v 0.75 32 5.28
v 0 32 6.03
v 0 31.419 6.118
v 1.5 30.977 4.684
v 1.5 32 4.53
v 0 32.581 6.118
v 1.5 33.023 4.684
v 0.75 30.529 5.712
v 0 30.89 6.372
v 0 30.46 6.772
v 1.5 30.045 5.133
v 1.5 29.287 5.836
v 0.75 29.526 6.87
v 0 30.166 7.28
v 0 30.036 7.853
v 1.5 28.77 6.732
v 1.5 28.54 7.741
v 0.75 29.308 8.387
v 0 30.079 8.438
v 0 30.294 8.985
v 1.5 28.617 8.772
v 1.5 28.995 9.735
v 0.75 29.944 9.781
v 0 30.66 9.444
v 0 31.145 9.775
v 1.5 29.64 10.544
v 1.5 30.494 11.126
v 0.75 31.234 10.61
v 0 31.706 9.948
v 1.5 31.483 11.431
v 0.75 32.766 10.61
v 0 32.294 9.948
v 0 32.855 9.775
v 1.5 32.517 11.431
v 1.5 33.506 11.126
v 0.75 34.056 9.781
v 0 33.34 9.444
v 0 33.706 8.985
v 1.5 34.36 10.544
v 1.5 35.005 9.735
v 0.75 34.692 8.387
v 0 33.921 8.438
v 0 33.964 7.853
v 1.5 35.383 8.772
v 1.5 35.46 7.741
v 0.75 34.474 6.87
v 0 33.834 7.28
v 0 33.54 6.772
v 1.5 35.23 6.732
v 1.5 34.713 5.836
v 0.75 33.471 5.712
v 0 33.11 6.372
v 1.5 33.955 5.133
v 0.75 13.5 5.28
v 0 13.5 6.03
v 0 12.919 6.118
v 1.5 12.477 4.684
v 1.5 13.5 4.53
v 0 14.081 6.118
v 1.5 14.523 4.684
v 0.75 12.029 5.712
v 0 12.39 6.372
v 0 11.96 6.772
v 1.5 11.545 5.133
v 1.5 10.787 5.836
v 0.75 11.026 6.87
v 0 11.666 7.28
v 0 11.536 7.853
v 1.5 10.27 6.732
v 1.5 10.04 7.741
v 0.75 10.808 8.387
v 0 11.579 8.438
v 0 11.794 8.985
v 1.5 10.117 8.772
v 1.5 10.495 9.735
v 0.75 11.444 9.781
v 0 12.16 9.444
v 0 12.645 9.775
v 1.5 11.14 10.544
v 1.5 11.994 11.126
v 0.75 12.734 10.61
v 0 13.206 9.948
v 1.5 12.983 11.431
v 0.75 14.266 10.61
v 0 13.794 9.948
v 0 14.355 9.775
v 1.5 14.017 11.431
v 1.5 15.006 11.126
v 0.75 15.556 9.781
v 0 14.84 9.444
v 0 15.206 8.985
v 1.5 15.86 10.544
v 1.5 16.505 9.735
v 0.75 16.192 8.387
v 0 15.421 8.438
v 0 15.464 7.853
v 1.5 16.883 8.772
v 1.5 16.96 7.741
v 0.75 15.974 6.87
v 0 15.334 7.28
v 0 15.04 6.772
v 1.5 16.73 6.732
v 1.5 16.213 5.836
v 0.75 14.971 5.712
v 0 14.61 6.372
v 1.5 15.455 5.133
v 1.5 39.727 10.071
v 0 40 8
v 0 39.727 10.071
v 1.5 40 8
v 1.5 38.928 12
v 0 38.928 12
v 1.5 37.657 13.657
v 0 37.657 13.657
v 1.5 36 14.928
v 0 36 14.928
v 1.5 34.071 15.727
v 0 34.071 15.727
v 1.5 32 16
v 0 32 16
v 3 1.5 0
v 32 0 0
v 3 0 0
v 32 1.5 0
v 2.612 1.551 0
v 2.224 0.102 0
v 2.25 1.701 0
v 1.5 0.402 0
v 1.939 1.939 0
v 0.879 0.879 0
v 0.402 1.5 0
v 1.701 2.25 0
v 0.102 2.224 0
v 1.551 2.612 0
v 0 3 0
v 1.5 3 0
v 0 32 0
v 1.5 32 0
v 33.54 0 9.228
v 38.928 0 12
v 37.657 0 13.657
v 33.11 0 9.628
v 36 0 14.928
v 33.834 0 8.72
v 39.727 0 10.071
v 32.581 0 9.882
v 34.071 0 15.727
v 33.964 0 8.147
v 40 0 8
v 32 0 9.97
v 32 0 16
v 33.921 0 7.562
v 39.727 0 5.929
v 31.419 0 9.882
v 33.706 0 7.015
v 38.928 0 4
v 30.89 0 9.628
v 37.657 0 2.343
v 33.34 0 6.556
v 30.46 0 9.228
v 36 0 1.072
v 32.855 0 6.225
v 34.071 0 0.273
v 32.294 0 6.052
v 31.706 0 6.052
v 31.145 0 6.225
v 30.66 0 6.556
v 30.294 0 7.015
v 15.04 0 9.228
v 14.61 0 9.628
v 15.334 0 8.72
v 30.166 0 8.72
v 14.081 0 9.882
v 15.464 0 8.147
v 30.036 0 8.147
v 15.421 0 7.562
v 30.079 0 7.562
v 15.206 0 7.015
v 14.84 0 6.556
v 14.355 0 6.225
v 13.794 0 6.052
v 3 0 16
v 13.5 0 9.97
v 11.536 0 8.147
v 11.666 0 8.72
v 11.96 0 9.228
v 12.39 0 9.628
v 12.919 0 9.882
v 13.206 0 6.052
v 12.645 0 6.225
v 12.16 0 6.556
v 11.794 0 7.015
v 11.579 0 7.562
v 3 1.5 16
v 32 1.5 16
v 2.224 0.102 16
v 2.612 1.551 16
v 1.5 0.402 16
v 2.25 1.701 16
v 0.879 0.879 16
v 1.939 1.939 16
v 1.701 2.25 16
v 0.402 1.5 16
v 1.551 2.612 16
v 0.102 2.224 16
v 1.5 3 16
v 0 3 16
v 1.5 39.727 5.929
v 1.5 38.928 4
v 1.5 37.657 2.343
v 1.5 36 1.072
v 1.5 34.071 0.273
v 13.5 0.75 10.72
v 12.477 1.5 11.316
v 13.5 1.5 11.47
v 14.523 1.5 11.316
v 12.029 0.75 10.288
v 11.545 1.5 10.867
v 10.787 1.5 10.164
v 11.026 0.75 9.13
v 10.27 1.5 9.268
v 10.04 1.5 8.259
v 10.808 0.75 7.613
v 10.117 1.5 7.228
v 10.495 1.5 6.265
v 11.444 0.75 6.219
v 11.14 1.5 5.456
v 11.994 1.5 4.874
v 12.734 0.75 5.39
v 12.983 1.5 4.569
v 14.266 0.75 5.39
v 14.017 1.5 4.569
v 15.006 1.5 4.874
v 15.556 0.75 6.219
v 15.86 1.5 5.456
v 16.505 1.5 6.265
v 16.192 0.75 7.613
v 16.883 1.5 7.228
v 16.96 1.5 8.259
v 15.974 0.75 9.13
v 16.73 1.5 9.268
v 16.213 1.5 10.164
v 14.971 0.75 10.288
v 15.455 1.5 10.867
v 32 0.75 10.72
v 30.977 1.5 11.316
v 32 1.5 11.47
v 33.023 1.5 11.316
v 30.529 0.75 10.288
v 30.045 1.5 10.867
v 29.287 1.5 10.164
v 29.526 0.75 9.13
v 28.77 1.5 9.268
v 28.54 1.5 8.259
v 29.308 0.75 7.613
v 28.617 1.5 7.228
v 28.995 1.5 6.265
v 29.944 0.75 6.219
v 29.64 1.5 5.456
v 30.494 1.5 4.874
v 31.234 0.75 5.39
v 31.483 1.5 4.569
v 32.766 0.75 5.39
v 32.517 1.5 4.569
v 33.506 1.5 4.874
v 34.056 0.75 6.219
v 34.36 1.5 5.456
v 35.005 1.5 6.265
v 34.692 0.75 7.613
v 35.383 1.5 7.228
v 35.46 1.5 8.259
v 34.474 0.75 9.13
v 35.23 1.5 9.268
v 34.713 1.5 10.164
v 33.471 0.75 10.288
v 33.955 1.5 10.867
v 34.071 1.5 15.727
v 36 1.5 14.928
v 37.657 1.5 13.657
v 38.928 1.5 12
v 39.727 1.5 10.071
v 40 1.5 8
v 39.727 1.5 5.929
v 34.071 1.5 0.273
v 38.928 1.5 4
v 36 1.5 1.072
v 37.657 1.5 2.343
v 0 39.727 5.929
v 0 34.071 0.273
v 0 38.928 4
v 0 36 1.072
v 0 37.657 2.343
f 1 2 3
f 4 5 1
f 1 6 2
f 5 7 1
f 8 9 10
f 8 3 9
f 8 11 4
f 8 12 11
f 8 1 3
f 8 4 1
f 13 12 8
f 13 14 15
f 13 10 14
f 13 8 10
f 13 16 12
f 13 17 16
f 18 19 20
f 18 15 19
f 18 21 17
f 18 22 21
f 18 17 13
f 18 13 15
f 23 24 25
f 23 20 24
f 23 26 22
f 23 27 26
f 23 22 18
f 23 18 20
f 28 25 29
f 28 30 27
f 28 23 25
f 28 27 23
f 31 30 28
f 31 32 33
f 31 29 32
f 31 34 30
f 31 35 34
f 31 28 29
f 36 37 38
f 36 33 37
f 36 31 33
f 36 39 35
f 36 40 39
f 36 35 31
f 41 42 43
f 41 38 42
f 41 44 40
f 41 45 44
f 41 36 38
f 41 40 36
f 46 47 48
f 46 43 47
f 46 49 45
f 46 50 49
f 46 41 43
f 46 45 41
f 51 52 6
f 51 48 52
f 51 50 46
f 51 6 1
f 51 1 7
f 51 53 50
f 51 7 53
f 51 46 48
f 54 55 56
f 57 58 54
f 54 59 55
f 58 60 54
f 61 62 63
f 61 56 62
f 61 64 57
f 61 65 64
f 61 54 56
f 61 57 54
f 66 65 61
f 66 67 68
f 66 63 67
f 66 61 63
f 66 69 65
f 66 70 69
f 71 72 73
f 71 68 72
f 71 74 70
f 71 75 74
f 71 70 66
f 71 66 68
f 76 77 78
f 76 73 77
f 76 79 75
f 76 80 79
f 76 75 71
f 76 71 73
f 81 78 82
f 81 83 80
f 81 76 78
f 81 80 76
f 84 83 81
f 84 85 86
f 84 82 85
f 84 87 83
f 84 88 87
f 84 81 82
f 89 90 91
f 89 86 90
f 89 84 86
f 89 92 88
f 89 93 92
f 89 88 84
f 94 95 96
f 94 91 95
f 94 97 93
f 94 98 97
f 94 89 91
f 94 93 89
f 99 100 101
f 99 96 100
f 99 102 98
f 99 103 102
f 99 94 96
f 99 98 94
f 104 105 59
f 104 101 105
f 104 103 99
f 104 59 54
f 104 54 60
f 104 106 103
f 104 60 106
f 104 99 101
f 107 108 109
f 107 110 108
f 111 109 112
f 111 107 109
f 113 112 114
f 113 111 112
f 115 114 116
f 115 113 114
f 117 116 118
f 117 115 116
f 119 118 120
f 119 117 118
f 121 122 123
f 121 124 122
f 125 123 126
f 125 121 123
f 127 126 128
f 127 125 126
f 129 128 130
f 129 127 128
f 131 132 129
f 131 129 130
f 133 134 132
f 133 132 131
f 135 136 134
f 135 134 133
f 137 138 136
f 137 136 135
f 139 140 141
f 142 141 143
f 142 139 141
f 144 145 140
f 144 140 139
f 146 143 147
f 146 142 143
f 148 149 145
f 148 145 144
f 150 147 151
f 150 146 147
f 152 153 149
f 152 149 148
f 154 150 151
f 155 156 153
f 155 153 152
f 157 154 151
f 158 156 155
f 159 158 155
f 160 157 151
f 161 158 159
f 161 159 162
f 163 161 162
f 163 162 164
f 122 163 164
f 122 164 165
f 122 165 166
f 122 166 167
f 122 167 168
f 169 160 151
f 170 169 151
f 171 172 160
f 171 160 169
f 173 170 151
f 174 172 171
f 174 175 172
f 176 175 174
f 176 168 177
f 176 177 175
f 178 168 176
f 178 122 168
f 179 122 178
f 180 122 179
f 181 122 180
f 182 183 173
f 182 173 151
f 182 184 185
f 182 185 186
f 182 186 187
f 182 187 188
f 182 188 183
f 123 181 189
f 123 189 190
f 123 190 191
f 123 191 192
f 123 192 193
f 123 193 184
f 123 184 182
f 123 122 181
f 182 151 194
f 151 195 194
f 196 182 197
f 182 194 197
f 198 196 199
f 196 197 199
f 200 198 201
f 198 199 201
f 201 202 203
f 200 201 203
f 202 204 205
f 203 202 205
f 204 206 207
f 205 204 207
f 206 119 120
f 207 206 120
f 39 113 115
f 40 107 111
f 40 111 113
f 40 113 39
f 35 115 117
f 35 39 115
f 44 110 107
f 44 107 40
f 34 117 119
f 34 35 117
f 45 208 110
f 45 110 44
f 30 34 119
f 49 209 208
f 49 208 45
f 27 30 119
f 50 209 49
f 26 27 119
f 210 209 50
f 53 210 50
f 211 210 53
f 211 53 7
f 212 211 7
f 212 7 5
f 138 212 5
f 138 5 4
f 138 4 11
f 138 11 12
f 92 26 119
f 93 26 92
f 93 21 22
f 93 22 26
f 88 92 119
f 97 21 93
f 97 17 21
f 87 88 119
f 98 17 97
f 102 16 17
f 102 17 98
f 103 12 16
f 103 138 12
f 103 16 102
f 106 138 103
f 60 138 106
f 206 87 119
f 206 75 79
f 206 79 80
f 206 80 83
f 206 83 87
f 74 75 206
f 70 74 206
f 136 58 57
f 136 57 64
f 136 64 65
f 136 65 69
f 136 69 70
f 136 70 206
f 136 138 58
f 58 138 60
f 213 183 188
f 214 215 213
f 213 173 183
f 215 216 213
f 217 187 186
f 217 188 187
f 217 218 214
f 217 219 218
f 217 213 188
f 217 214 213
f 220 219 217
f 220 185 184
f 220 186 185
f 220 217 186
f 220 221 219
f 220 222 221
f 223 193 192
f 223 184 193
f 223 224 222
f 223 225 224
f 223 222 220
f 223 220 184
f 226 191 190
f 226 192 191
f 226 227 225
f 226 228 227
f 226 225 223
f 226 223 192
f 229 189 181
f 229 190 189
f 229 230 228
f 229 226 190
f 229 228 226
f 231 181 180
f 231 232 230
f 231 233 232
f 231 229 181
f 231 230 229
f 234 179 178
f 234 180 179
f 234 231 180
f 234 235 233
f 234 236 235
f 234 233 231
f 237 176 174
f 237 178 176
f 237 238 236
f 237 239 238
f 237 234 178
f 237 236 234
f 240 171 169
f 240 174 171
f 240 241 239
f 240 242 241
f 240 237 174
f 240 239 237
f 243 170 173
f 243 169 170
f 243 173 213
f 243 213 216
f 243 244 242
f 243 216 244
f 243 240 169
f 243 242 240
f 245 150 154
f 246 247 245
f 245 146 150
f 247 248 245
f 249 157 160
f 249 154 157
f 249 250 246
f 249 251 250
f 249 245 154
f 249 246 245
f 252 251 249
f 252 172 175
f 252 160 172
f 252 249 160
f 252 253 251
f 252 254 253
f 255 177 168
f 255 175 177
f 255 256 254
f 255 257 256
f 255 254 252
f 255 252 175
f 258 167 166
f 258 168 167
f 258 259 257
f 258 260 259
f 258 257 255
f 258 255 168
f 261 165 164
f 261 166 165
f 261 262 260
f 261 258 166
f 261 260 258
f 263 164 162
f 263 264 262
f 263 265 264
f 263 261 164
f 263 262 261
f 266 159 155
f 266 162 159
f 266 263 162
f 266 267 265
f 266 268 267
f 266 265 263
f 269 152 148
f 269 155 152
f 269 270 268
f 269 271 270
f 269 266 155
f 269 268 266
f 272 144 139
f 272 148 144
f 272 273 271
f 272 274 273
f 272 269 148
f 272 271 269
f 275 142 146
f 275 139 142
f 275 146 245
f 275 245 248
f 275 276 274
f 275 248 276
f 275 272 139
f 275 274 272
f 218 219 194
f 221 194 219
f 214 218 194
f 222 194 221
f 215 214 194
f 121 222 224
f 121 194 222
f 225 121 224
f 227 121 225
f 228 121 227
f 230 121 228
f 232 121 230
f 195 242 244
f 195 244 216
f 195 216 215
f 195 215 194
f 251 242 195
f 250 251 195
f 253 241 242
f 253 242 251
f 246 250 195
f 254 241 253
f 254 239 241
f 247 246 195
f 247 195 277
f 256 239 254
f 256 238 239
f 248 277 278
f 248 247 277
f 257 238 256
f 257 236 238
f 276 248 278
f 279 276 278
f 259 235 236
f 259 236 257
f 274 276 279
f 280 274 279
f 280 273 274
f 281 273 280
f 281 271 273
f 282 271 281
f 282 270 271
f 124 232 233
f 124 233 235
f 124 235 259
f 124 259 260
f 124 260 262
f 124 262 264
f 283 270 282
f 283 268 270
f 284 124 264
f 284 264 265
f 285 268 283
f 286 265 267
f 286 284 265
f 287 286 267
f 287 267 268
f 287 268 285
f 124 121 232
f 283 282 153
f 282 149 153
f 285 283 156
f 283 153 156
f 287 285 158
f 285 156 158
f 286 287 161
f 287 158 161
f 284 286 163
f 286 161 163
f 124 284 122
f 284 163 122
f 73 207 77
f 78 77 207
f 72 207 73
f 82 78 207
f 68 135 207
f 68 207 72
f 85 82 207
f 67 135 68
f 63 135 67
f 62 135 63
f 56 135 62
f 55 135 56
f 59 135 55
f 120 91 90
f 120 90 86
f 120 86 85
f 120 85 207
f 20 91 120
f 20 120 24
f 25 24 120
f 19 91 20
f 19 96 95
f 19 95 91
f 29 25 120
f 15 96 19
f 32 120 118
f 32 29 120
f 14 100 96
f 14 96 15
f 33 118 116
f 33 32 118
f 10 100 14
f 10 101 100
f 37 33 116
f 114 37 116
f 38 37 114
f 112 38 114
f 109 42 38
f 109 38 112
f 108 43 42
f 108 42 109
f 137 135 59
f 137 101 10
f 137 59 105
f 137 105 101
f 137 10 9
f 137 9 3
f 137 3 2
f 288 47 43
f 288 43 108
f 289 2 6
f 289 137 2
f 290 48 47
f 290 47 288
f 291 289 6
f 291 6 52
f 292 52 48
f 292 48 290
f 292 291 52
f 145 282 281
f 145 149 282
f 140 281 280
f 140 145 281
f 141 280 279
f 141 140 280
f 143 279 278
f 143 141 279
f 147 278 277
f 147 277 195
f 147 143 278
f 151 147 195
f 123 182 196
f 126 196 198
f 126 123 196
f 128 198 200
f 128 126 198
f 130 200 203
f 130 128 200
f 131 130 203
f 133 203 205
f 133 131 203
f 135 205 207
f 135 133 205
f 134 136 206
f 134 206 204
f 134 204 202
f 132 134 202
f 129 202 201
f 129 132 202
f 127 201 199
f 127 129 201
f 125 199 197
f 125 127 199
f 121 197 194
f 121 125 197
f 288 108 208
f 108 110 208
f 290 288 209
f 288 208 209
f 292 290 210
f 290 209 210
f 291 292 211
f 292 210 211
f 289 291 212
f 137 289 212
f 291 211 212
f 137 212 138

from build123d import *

# Parameters (mm, degrees)
BASE_FLANGIA1_DEPTH    = 16
RACCORDO1_R            = 8
RIPETIZIONE_A_L1_COUNT = 2
RIPETIZIONE_A_L1_PITCH = 18.5
RIPETIZIONE_A_L2_COUNT = 2
RIPETIZIONE_A_L2_PITCH = 18.5


# Sheet-metal steps are written as plain solids
with BuildPart() as part:
    # Schizzo1 → Base-Flangia1 (new body)
    with BuildSketch(Plane.XY):
        with BuildLine():
            Line((40, 0), (3, 0))
            ThreePointArc((3, 0), (0.878679656, 0.878679656), (0, 3))
            Line((0, 3), (0, 40))
            Line((0, 40), (1.5, 40))
            Line((1.5, 40), (1.5, 3))
            ThreePointArc((1.5, 3), (1.939339828, 1.939339828), (3, 1.5))
            Line((3, 1.5), (40, 1.5))
            Line((40, 1.5), (40, 0))
        make_face()
    extrude(amount=BASE_FLANGIA1_DEPTH)

    # Raccordo1
    raccordo1_edges = [part.edges().sort_by_distance(p)[0] for p in [
        (40, 0.75, 16),
        (40, 0.75, 0),
        (0.75, 40, 0),
        (0.75, 40, 16),
    ]]
    fillet(raccordo1_edges, radius=RACCORDO1_R - 0.0001)  # a hair under: the kernel refuses the full size

    # Schizzo7 → Foro svasato per Vite M3 a testa svasata (revolve, cut)
    with BuildSketch(Plane(origin=(32, 1.5, 8), x_dir=(0, 0, 1), z_dir=(1, 0, 0))):
        Polygon((0, 0), (0, 1.5), (1.7, 1.5), (1.7, 1.77), (3.47, 0), align=None)
    foro_svasato_per_vite_m3_a_testa_svasata = revolve(axis=Axis((32, 7.85, 8), (0, -1, 0)), mode=Mode.SUBTRACT)

    # Ripetizione a L1: Foro svasato per Vite M3 a testa svasata ×2
    with Locations(*[(-i * RIPETIZIONE_A_L1_PITCH, 0, 0) for i in range(1, RIPETIZIONE_A_L1_COUNT)]):
        add(foro_svasato_per_vite_m3_a_testa_svasata, mode=Mode.SUBTRACT)

    # Schizzo9 → Foro svasato per Vite M3 a testa sva 2 (revolve, cut)
    with BuildSketch(Plane(origin=(1.5, 32, 8), x_dir=(0, 0, -1), z_dir=(0, 1, 0))):
        Polygon((0, 0), (0, 1.5), (1.7, 1.5), (1.7, 1.77), (3.47, 0), align=None)
    foro_svasato_per_vite_m3_a_testa_sva_2 = revolve(axis=Axis((7.85, 32, 8), (-1, 0, 0)), mode=Mode.SUBTRACT)

    # Ripetizione a L2: Foro svasato per Vite M3 a testa sva 2 ×2
    with Locations(*[(0, -i * RIPETIZIONE_A_L2_PITCH, 0) for i in range(1, RIPETIZIONE_A_L2_COUNT)]):
        add(foro_svasato_per_vite_m3_a_testa_sva_2, mode=Mode.SUBTRACT)


solid = part.part
